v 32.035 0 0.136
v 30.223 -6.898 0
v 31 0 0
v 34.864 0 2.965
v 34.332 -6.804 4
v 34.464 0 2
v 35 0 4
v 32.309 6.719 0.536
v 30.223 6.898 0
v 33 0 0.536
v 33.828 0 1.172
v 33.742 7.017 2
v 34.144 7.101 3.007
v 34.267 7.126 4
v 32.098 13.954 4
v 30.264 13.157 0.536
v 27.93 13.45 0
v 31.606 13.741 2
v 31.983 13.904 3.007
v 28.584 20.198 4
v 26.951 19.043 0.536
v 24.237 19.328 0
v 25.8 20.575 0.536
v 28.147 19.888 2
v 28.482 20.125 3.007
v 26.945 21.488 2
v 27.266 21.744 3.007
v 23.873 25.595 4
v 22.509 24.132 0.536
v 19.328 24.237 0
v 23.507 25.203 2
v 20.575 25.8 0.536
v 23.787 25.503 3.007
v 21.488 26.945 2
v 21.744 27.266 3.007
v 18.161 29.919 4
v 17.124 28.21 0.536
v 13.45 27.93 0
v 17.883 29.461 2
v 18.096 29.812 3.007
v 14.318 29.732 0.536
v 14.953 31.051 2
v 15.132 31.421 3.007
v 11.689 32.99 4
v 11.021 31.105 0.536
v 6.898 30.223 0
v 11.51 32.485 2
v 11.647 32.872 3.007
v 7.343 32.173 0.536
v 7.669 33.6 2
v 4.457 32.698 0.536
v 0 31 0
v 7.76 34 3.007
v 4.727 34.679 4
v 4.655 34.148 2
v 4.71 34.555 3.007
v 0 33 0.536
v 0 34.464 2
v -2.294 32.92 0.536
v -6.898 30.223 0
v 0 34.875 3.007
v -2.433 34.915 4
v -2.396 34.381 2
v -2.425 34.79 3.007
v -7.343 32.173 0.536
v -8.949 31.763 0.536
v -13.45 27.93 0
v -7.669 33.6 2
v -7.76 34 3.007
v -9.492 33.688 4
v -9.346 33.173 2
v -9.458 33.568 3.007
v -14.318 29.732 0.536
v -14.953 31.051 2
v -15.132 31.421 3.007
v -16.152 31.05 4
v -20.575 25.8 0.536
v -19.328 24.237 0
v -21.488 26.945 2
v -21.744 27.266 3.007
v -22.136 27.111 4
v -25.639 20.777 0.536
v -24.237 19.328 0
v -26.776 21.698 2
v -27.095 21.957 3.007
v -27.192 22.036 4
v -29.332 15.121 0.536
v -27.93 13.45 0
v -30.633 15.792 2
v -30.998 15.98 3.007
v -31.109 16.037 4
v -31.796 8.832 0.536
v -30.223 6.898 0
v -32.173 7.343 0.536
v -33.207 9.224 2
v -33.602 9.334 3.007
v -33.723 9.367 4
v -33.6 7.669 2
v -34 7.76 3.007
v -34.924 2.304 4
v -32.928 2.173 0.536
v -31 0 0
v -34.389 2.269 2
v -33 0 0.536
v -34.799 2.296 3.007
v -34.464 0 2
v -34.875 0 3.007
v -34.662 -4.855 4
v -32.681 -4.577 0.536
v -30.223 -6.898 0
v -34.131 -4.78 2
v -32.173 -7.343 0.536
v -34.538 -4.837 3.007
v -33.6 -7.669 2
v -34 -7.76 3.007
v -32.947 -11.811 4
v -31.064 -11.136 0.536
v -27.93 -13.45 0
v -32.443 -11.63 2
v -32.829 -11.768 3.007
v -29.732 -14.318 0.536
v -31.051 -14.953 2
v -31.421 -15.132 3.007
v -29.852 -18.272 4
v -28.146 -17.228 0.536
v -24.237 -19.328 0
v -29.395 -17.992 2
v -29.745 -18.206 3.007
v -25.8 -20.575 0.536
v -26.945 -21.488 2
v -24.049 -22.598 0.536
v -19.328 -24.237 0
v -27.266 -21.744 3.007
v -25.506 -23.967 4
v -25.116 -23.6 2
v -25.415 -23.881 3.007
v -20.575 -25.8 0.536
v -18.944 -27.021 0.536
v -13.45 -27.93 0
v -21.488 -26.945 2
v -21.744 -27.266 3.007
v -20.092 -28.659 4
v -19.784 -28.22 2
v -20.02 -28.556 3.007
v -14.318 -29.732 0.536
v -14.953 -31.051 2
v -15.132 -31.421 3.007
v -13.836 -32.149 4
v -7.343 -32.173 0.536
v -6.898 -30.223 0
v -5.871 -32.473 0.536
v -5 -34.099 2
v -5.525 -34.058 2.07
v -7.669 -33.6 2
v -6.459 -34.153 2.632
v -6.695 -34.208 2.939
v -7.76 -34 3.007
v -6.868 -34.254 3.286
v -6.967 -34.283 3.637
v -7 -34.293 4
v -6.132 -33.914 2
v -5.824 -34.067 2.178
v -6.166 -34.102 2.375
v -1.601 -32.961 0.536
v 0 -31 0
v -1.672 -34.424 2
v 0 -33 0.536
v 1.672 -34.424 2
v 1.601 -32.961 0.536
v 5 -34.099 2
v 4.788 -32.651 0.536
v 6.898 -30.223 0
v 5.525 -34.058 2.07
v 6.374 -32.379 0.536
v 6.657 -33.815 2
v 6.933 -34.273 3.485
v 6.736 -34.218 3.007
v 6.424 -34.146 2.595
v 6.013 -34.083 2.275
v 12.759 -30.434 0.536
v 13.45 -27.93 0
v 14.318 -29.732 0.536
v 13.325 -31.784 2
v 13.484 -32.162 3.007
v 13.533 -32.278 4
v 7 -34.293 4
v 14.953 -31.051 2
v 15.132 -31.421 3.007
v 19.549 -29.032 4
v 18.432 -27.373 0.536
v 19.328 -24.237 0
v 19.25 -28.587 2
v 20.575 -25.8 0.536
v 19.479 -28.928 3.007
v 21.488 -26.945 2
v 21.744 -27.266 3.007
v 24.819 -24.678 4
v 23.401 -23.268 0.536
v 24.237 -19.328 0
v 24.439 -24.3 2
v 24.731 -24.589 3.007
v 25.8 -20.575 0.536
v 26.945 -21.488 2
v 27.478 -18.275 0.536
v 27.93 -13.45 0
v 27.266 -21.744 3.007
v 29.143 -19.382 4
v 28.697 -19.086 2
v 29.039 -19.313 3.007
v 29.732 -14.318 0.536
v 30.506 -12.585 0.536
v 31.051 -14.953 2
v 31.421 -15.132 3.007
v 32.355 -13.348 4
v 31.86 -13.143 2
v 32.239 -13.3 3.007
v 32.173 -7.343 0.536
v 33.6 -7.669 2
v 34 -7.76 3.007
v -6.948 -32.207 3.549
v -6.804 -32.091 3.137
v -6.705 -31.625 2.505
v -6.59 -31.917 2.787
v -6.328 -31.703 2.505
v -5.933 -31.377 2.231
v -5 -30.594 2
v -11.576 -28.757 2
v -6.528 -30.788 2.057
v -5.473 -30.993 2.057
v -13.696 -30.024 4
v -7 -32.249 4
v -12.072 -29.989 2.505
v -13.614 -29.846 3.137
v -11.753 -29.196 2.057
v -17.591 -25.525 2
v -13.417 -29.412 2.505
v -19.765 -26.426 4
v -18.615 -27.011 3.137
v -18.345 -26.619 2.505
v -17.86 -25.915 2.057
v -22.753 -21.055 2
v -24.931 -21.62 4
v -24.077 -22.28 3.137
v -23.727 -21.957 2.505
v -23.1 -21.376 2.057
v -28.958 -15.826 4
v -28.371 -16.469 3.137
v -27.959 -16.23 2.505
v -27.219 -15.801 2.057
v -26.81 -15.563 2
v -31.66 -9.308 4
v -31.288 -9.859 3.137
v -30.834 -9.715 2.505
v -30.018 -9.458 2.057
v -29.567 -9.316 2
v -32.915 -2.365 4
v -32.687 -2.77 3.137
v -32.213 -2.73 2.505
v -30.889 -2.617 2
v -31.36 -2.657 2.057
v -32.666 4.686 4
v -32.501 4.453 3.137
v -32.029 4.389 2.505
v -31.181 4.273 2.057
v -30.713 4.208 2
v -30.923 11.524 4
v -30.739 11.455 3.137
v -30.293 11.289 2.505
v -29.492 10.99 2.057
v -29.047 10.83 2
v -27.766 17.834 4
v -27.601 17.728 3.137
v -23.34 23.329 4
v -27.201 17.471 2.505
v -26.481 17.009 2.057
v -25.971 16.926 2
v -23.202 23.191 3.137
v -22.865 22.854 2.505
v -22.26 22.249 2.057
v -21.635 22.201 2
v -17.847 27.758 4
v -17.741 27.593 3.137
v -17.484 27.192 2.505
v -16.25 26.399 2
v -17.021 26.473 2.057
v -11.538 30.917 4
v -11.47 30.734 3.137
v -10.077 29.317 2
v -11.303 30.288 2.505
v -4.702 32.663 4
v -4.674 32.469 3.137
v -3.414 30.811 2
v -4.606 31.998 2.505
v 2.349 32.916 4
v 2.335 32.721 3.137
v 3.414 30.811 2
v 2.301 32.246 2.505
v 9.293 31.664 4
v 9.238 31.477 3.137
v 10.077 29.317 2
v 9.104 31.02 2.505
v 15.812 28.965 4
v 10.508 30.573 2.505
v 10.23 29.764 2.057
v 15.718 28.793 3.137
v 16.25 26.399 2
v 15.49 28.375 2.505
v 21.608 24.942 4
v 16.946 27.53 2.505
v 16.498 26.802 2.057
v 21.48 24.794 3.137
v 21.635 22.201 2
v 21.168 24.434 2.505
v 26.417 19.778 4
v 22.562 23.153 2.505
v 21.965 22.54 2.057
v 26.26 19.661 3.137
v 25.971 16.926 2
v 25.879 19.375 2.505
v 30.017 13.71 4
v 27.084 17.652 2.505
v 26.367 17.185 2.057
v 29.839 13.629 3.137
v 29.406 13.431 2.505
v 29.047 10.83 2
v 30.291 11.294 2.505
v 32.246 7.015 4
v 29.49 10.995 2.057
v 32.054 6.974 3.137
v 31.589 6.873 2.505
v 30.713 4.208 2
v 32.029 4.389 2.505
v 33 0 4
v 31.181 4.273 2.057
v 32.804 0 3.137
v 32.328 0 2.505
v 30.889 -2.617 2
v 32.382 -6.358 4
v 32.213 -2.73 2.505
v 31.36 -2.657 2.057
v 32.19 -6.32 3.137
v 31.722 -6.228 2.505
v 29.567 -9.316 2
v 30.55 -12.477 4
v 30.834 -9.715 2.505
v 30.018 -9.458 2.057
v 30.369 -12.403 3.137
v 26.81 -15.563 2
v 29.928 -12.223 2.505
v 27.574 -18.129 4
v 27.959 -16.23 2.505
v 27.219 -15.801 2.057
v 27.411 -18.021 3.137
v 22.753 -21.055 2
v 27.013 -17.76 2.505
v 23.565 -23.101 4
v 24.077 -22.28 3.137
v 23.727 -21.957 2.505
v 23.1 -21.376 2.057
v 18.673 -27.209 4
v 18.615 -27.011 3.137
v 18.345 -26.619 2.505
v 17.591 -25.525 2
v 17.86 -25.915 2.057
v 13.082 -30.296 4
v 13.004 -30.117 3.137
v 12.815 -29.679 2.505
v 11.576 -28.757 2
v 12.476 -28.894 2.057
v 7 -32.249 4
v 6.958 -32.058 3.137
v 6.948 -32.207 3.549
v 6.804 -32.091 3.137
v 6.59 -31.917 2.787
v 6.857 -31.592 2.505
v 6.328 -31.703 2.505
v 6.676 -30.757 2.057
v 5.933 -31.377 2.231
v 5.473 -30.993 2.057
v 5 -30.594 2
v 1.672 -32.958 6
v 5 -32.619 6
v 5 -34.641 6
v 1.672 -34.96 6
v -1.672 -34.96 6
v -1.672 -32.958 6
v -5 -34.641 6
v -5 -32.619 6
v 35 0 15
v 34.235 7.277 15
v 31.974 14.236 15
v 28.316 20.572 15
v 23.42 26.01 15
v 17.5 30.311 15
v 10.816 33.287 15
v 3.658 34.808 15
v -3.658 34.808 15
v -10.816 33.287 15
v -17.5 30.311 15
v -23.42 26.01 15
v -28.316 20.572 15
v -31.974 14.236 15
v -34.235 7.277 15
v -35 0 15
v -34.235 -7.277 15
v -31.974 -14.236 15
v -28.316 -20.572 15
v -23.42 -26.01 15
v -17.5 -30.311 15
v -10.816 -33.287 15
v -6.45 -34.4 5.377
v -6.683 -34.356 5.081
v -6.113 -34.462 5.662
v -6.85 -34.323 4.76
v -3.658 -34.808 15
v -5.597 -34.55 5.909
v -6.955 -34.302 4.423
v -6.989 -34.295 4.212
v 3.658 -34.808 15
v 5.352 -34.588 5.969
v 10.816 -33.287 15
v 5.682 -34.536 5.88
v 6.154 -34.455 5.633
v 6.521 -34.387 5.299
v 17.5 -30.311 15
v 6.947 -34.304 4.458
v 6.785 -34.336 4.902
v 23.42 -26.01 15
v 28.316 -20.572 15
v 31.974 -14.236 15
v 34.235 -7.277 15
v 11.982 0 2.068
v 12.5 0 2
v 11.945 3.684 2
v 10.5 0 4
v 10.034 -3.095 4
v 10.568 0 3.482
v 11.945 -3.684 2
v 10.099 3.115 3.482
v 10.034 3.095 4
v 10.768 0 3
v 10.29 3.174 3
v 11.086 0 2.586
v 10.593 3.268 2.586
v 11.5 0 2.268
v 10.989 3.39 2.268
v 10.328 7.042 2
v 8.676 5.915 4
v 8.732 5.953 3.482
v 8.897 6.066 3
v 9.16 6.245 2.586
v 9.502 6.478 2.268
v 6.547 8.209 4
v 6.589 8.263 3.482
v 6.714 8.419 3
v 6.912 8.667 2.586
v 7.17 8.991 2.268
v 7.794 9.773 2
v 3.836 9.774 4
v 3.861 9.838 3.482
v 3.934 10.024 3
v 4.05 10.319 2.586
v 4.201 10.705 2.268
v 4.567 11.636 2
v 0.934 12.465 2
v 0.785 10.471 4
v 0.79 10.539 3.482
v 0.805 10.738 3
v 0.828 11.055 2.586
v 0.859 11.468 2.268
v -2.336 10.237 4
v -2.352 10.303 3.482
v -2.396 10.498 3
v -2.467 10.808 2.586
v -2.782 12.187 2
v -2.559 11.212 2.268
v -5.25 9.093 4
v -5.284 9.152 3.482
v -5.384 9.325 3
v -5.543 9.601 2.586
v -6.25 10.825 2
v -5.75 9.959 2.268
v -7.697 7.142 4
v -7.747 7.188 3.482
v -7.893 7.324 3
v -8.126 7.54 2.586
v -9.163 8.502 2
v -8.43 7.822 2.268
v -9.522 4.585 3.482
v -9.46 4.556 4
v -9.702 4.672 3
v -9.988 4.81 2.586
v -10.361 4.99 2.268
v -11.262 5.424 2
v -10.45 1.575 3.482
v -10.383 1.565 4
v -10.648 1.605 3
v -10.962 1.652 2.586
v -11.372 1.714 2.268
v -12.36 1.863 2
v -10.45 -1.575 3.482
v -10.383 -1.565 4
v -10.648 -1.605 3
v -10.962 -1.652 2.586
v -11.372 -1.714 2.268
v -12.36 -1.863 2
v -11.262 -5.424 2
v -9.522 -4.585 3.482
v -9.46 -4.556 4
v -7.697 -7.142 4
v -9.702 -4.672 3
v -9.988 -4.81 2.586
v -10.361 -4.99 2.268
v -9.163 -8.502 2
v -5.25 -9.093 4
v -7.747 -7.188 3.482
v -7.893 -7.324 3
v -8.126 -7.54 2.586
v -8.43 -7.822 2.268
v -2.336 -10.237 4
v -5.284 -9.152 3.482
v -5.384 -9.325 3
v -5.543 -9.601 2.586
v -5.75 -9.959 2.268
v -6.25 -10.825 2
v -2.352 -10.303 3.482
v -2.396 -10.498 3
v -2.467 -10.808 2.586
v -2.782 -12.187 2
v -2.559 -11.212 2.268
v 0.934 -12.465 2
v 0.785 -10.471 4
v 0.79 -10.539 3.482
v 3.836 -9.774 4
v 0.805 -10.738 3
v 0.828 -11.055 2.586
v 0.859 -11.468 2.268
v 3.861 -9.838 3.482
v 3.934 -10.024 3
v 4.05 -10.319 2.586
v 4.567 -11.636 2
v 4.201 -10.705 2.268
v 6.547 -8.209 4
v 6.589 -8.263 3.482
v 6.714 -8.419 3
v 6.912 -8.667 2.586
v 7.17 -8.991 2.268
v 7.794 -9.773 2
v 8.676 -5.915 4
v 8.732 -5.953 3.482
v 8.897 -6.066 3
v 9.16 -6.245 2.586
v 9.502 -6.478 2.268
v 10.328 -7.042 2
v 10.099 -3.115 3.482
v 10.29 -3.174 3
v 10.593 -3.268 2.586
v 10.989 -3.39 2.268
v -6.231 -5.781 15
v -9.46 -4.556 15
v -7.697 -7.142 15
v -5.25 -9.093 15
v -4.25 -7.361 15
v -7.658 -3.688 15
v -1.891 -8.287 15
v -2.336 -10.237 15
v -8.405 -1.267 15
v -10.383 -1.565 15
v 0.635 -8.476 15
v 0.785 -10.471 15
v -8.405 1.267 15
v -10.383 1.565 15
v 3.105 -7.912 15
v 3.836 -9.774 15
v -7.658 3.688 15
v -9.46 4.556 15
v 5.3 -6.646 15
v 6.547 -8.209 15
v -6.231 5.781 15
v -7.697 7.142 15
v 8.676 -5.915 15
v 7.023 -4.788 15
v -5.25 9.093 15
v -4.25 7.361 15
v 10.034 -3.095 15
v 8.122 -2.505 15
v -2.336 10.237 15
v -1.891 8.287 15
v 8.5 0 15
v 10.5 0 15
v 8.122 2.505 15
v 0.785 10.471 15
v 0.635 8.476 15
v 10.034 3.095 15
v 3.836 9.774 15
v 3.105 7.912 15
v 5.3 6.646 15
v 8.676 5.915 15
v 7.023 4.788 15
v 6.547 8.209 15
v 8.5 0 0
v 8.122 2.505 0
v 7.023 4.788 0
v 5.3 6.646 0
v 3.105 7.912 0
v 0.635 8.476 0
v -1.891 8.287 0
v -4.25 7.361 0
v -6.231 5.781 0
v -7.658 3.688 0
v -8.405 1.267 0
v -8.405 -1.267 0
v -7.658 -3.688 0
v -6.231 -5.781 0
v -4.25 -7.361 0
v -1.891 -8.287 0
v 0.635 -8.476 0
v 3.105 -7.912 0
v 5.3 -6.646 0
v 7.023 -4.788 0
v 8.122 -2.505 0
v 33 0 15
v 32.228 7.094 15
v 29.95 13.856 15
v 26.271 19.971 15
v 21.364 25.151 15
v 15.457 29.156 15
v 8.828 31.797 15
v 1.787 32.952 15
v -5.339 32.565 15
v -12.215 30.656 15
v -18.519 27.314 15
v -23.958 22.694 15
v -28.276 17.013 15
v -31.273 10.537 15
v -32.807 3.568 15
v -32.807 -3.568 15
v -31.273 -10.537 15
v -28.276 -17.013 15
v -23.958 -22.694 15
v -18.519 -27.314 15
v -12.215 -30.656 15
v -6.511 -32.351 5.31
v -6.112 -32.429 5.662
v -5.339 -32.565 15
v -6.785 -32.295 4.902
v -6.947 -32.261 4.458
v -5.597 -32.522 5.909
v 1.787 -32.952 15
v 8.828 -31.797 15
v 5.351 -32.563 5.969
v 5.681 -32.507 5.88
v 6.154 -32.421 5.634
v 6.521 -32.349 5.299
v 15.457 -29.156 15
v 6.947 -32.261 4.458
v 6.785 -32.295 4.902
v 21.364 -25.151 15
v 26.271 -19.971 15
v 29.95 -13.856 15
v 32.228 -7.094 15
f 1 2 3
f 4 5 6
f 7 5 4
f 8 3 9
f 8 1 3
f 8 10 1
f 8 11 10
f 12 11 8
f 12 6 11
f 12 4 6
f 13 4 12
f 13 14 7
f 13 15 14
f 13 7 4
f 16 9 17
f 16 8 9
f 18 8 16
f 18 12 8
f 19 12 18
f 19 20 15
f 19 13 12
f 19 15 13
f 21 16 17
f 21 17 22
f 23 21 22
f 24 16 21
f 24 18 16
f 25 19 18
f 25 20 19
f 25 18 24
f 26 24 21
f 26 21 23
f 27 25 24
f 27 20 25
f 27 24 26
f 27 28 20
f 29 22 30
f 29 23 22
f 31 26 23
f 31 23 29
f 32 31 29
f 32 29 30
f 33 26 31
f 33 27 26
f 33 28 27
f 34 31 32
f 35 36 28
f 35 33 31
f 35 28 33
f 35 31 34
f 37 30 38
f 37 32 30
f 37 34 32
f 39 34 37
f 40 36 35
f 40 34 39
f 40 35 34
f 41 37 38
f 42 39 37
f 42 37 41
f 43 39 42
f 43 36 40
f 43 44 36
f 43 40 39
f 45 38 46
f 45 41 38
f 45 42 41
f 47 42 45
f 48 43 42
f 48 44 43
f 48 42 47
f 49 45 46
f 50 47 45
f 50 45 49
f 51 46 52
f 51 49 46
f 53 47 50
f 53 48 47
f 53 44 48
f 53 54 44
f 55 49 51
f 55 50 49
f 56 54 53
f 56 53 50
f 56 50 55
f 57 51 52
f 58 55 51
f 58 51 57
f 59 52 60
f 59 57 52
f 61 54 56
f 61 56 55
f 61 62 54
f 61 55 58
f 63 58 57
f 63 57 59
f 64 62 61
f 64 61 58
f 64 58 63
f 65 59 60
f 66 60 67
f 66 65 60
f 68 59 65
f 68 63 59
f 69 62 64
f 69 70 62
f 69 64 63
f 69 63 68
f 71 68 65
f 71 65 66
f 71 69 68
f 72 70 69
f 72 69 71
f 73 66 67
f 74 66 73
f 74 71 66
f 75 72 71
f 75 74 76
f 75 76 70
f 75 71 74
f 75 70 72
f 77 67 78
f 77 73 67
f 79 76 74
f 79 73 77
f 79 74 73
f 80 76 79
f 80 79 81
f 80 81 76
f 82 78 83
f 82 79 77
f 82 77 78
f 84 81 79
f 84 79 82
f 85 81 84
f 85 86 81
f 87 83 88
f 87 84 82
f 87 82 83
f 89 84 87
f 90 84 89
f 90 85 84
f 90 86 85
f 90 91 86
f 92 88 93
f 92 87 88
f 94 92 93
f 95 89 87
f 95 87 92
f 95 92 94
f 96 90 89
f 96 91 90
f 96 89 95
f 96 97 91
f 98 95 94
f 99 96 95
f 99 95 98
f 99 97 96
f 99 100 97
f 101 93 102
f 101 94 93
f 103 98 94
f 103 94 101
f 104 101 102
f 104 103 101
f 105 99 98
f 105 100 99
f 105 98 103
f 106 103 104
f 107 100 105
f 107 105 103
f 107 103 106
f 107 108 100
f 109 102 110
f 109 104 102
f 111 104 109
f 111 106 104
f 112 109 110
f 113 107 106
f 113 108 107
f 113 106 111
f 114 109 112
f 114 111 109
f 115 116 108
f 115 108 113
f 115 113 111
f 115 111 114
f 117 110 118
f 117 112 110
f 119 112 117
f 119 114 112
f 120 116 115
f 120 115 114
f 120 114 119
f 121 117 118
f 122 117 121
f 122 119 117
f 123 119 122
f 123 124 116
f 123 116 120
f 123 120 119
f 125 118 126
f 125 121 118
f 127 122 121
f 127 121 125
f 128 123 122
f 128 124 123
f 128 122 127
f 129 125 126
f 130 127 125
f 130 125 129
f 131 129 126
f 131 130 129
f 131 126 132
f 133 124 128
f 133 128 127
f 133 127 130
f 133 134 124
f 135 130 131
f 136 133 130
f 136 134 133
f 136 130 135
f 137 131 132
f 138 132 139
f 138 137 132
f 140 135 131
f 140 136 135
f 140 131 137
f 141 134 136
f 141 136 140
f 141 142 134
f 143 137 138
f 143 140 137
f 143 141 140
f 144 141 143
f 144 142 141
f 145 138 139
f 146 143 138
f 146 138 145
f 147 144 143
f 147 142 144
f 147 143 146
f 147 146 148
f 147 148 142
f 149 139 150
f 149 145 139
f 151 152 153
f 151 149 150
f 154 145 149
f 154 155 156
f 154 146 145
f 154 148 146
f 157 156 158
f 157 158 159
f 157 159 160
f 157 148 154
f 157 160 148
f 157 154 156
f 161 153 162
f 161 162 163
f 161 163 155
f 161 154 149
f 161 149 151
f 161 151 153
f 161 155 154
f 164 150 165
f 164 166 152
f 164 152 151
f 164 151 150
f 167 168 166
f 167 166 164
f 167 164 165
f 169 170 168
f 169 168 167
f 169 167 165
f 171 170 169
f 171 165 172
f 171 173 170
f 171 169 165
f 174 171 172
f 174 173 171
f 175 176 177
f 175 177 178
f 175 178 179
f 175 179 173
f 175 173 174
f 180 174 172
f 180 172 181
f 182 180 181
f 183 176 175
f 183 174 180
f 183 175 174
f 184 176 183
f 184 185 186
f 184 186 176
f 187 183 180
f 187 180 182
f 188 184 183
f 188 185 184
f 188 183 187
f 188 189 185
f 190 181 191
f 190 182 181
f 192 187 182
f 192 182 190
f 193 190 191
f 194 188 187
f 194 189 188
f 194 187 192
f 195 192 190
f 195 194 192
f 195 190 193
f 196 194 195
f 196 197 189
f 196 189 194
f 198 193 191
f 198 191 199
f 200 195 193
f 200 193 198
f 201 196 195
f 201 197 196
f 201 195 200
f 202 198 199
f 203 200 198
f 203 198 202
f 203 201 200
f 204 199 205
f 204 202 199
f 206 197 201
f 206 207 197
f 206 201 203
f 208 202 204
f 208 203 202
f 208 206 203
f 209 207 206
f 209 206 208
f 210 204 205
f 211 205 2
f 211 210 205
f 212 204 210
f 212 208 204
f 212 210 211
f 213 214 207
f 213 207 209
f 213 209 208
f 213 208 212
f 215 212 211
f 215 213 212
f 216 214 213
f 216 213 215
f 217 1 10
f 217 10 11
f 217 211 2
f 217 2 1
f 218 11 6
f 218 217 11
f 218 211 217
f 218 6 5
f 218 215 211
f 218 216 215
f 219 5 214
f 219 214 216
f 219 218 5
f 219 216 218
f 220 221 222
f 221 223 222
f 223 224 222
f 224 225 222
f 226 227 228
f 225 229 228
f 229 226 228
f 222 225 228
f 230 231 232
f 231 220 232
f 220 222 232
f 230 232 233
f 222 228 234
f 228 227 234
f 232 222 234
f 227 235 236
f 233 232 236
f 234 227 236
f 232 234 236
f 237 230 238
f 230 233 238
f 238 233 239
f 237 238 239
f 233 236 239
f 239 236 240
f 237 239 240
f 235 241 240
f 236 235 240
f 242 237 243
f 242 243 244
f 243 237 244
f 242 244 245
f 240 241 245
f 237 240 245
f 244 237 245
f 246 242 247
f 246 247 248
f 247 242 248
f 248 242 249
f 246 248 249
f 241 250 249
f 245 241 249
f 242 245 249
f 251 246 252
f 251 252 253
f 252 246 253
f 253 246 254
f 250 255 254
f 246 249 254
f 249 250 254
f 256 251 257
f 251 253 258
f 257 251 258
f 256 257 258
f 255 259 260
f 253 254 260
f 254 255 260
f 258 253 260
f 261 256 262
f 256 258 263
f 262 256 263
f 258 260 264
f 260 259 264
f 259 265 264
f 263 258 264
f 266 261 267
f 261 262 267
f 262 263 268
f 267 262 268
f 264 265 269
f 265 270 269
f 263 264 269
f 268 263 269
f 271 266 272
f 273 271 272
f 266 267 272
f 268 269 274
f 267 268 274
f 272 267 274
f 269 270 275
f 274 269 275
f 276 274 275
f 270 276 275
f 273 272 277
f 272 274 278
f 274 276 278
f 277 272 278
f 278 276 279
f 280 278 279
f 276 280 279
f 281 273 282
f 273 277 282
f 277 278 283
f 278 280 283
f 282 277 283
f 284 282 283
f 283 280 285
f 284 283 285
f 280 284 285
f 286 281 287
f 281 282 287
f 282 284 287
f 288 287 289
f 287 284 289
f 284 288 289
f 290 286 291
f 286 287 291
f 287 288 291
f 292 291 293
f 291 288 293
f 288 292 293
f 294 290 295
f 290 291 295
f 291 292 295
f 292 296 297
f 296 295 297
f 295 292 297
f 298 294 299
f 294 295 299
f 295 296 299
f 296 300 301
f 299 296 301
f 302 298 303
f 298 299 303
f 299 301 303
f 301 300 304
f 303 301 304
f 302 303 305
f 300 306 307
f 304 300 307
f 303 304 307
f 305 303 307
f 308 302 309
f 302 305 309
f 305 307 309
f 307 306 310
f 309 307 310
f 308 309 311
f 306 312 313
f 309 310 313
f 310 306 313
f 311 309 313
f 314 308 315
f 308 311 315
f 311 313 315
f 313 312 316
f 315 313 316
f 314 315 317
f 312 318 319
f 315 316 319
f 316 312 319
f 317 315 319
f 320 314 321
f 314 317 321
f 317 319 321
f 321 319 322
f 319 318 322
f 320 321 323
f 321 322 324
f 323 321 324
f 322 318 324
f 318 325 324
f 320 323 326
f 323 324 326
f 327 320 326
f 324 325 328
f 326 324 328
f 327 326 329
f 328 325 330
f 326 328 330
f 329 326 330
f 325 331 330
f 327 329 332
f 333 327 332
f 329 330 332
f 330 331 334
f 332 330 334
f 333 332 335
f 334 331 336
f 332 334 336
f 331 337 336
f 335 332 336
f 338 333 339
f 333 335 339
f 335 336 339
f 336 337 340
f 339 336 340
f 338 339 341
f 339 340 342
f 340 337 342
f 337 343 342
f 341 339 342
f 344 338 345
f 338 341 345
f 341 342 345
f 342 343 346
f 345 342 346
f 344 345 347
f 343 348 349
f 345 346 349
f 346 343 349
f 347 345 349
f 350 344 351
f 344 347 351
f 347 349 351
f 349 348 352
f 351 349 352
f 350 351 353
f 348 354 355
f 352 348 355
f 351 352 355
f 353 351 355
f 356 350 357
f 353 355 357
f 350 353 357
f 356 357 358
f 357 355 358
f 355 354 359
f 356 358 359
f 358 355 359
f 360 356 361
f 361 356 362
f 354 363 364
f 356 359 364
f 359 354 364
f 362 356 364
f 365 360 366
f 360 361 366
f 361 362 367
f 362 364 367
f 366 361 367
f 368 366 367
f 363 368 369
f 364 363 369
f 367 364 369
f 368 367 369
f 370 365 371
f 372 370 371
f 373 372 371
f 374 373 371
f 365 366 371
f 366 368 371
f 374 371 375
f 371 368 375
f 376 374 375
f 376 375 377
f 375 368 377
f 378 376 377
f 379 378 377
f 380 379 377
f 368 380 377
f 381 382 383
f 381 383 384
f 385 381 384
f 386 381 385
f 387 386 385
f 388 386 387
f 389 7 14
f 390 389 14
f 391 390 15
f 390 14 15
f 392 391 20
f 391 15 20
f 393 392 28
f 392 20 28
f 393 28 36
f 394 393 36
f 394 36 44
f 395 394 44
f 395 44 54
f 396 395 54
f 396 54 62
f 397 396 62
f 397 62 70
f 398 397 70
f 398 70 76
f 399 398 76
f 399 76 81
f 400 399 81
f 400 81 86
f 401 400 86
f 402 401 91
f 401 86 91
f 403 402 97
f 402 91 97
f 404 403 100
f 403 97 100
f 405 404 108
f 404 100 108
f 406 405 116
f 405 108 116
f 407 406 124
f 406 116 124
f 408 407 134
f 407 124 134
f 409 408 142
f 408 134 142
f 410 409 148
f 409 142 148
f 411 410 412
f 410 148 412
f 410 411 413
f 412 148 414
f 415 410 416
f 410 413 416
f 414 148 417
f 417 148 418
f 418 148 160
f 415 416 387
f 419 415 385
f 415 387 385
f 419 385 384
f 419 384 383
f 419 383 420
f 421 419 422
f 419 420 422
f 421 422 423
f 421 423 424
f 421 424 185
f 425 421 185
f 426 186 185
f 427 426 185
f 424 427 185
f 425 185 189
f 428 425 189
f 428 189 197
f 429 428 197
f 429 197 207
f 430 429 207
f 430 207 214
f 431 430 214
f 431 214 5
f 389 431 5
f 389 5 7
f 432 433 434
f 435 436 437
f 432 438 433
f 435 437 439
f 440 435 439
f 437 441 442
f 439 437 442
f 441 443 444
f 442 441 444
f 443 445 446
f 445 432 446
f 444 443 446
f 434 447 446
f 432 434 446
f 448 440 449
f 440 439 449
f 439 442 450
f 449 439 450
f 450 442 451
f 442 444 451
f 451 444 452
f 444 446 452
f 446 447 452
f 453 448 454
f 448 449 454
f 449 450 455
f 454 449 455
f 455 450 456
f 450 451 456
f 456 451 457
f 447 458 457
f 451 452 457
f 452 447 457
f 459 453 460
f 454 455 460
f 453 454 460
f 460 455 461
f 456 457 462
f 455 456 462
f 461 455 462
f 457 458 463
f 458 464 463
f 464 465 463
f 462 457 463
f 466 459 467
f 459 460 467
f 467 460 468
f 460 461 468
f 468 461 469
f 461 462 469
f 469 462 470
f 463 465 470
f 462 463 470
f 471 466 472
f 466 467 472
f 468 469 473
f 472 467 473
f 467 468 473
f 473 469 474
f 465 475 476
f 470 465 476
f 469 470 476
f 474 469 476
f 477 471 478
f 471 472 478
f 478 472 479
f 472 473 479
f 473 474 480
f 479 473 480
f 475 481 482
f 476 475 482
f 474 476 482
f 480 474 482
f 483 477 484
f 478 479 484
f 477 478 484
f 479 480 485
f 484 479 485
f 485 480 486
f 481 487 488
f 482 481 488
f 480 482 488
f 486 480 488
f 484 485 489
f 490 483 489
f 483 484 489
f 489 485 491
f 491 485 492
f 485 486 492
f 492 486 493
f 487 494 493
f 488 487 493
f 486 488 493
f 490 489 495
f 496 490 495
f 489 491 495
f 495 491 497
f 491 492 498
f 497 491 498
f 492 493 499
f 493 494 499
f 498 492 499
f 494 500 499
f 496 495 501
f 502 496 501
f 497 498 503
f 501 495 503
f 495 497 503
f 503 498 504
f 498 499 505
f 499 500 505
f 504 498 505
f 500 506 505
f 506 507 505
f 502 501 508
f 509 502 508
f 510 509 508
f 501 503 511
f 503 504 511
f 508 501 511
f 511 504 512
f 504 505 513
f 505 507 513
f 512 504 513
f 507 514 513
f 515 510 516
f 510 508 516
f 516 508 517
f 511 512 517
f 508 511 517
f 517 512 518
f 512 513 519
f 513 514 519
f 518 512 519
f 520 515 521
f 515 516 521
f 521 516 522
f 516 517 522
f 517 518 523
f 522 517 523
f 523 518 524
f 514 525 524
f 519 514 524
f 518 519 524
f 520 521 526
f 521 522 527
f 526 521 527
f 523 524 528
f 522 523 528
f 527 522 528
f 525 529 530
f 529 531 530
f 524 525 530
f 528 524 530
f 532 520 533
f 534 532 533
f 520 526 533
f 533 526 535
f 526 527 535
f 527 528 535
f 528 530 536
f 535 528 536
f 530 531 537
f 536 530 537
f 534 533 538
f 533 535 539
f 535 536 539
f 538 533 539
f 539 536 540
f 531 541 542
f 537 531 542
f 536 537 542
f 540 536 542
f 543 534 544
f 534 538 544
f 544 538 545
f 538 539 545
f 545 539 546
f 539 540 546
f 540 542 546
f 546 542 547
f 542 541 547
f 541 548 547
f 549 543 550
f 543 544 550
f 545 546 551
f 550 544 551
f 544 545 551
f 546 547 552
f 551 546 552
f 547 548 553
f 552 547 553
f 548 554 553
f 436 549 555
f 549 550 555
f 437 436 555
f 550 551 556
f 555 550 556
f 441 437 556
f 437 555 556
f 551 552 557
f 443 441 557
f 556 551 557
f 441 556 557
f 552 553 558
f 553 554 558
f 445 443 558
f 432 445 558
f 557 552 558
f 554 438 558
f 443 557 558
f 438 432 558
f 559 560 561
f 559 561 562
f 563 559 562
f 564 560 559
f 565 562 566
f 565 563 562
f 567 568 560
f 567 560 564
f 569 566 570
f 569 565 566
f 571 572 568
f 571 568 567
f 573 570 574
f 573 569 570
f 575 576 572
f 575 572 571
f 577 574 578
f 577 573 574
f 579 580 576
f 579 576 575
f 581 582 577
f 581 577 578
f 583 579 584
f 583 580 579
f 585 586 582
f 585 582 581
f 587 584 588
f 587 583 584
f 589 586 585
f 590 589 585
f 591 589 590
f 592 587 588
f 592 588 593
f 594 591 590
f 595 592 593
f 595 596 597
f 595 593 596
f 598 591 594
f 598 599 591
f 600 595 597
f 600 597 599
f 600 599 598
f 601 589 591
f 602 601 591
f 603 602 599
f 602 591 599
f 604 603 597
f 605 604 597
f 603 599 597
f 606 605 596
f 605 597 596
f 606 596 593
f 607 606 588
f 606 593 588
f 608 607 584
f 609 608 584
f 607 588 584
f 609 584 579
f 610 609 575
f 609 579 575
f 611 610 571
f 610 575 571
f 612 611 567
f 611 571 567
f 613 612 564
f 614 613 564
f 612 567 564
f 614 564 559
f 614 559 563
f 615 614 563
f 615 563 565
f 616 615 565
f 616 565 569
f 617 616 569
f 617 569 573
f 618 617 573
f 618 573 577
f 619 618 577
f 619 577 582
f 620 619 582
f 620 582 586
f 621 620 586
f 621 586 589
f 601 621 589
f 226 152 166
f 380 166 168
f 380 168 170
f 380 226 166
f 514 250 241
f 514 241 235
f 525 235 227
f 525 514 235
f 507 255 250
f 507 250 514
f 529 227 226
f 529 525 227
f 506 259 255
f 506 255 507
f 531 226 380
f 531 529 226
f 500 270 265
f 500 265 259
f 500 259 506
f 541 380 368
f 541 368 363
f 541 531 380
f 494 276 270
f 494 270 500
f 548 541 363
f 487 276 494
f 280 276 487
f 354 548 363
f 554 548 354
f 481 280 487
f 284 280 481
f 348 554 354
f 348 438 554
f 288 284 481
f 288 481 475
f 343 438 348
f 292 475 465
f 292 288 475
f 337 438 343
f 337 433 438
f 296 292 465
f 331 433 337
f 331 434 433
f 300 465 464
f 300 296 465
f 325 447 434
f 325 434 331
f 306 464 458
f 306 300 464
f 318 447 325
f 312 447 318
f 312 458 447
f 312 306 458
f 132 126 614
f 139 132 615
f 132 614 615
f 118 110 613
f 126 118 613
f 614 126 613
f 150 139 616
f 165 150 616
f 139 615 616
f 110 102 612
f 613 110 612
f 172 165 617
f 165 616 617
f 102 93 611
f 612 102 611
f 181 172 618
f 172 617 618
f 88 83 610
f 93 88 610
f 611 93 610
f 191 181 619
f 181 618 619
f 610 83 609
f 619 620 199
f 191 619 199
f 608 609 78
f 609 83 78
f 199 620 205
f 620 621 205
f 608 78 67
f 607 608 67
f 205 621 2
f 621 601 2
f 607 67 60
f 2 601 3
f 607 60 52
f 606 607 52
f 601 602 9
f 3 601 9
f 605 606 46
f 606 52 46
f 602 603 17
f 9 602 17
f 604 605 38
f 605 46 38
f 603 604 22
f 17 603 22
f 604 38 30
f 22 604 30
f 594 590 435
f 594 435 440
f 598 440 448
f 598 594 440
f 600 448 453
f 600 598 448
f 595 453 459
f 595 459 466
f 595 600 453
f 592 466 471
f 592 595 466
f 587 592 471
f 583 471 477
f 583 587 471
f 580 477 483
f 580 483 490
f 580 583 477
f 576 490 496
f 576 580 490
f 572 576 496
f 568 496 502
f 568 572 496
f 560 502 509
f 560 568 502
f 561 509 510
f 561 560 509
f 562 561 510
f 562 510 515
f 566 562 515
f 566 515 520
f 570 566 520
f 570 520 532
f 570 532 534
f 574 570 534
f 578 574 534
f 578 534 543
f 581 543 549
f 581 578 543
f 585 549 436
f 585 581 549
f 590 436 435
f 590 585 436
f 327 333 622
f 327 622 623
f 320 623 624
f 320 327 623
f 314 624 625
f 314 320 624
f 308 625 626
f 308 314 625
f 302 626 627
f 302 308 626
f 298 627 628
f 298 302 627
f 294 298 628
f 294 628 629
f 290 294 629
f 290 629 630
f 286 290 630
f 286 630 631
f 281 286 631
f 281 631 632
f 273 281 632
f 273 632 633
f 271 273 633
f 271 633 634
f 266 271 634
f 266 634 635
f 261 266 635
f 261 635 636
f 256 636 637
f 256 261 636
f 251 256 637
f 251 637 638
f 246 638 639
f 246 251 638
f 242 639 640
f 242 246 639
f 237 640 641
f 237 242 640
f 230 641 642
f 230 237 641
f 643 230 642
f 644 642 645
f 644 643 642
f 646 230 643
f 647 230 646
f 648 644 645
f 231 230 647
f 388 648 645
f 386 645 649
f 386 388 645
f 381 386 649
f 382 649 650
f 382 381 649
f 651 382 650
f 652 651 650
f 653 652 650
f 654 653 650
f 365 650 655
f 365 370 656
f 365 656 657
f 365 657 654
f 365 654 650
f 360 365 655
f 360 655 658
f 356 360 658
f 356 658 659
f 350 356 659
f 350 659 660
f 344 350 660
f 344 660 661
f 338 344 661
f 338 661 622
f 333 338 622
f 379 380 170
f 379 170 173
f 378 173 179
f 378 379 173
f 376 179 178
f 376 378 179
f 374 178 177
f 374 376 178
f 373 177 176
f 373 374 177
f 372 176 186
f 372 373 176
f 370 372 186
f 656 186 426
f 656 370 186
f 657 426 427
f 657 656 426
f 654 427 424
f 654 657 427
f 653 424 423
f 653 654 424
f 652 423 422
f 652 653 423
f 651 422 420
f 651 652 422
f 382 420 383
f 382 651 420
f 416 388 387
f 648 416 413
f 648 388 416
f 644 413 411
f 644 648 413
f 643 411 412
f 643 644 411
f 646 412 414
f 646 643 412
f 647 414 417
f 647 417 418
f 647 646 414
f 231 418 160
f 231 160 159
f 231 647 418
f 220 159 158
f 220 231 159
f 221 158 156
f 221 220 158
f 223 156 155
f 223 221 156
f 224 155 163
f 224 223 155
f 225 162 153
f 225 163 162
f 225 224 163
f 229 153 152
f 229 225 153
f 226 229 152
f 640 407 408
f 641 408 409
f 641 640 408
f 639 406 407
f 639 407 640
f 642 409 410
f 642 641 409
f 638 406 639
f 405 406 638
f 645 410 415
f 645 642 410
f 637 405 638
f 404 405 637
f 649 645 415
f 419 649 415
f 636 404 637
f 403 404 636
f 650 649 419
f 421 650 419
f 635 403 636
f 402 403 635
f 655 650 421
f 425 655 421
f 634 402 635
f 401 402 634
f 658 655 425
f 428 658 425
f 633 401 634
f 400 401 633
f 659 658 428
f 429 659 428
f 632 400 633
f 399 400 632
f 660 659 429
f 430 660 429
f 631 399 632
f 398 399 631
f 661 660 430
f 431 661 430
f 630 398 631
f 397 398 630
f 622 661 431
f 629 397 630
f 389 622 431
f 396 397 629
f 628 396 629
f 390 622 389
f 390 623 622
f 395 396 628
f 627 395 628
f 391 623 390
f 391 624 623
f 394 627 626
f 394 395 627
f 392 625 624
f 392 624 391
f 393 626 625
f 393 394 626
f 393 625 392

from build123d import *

# Parameters (mm, degrees)
CROQUIS1_R              = 35
SALIENTE_EXTRUIR1_DEPTH = 15
CROQUIS2_R              = 8.5
CORTAR_EXTRUIR1_DEPTH   = 52.720402164
VACIADO1_T              = -2
REDONDEO1_R             = 2
REDONDEO2_R             = 4
CORTAR_EXTRUIR2_START   = -25
CORTAR_EXTRUIR2_DEPTH   = 27.720402164


with BuildPart() as part:
    # Croquis1 → Saliente-Extruir1 (new body)
    with BuildSketch(Plane.XY):
        Circle(CROQUIS1_R)
    extrude(amount=SALIENTE_EXTRUIR1_DEPTH)

    # Croquis2 → Cortar-Extruir1 (cut, through all)
    with BuildSketch(Plane.XY.offset(15)):
        Circle(CROQUIS2_R)
    extrude(amount=-CORTAR_EXTRUIR1_DEPTH, mode=Mode.SUBTRACT)

    # Vaciado1
    vaciado1_openings = [part.faces().sort_by_distance(p)[0] for p in [
        (-34.010050506, 0, 15),
    ]]
    offset(amount=VACIADO1_T, openings=vaciado1_openings, kind=Kind.INTERSECTION)

    # Redondeo1
    redondeo1_edges = [part.edges().sort_by_distance(p)[0] for p in [
        (-33, 0, 2),
        (-10.5, 0, 2),
    ]]
    fillet(redondeo1_edges, radius=REDONDEO1_R)

    # Redondeo2
    redondeo2_edges = [part.edges().sort_by_distance(p)[0] for p in [
        (-35, 0, 0),
    ]]
    fillet(redondeo2_edges, radius=REDONDEO2_R)

    # Croquis3 → Cortar-Extruir2 (cut, through all)
    with BuildSketch(Plane(origin=(0, 0, 0), x_dir=(1, 0, 0), z_dir=(0, 1, 0)).offset(CORTAR_EXTRUIR2_START)):
        with BuildLine():
            Line((-5, -2), (5, -2))
            ThreePointArc((5, -2), (7, -4), (5, -6))
            Line((5, -6), (-5, -6))
            ThreePointArc((-5, -6), (-7, -4), (-5, -2))
        make_face()
    extrude(amount=-CORTAR_EXTRUIR2_DEPTH, mode=Mode.SUBTRACT)


solid = part.part
